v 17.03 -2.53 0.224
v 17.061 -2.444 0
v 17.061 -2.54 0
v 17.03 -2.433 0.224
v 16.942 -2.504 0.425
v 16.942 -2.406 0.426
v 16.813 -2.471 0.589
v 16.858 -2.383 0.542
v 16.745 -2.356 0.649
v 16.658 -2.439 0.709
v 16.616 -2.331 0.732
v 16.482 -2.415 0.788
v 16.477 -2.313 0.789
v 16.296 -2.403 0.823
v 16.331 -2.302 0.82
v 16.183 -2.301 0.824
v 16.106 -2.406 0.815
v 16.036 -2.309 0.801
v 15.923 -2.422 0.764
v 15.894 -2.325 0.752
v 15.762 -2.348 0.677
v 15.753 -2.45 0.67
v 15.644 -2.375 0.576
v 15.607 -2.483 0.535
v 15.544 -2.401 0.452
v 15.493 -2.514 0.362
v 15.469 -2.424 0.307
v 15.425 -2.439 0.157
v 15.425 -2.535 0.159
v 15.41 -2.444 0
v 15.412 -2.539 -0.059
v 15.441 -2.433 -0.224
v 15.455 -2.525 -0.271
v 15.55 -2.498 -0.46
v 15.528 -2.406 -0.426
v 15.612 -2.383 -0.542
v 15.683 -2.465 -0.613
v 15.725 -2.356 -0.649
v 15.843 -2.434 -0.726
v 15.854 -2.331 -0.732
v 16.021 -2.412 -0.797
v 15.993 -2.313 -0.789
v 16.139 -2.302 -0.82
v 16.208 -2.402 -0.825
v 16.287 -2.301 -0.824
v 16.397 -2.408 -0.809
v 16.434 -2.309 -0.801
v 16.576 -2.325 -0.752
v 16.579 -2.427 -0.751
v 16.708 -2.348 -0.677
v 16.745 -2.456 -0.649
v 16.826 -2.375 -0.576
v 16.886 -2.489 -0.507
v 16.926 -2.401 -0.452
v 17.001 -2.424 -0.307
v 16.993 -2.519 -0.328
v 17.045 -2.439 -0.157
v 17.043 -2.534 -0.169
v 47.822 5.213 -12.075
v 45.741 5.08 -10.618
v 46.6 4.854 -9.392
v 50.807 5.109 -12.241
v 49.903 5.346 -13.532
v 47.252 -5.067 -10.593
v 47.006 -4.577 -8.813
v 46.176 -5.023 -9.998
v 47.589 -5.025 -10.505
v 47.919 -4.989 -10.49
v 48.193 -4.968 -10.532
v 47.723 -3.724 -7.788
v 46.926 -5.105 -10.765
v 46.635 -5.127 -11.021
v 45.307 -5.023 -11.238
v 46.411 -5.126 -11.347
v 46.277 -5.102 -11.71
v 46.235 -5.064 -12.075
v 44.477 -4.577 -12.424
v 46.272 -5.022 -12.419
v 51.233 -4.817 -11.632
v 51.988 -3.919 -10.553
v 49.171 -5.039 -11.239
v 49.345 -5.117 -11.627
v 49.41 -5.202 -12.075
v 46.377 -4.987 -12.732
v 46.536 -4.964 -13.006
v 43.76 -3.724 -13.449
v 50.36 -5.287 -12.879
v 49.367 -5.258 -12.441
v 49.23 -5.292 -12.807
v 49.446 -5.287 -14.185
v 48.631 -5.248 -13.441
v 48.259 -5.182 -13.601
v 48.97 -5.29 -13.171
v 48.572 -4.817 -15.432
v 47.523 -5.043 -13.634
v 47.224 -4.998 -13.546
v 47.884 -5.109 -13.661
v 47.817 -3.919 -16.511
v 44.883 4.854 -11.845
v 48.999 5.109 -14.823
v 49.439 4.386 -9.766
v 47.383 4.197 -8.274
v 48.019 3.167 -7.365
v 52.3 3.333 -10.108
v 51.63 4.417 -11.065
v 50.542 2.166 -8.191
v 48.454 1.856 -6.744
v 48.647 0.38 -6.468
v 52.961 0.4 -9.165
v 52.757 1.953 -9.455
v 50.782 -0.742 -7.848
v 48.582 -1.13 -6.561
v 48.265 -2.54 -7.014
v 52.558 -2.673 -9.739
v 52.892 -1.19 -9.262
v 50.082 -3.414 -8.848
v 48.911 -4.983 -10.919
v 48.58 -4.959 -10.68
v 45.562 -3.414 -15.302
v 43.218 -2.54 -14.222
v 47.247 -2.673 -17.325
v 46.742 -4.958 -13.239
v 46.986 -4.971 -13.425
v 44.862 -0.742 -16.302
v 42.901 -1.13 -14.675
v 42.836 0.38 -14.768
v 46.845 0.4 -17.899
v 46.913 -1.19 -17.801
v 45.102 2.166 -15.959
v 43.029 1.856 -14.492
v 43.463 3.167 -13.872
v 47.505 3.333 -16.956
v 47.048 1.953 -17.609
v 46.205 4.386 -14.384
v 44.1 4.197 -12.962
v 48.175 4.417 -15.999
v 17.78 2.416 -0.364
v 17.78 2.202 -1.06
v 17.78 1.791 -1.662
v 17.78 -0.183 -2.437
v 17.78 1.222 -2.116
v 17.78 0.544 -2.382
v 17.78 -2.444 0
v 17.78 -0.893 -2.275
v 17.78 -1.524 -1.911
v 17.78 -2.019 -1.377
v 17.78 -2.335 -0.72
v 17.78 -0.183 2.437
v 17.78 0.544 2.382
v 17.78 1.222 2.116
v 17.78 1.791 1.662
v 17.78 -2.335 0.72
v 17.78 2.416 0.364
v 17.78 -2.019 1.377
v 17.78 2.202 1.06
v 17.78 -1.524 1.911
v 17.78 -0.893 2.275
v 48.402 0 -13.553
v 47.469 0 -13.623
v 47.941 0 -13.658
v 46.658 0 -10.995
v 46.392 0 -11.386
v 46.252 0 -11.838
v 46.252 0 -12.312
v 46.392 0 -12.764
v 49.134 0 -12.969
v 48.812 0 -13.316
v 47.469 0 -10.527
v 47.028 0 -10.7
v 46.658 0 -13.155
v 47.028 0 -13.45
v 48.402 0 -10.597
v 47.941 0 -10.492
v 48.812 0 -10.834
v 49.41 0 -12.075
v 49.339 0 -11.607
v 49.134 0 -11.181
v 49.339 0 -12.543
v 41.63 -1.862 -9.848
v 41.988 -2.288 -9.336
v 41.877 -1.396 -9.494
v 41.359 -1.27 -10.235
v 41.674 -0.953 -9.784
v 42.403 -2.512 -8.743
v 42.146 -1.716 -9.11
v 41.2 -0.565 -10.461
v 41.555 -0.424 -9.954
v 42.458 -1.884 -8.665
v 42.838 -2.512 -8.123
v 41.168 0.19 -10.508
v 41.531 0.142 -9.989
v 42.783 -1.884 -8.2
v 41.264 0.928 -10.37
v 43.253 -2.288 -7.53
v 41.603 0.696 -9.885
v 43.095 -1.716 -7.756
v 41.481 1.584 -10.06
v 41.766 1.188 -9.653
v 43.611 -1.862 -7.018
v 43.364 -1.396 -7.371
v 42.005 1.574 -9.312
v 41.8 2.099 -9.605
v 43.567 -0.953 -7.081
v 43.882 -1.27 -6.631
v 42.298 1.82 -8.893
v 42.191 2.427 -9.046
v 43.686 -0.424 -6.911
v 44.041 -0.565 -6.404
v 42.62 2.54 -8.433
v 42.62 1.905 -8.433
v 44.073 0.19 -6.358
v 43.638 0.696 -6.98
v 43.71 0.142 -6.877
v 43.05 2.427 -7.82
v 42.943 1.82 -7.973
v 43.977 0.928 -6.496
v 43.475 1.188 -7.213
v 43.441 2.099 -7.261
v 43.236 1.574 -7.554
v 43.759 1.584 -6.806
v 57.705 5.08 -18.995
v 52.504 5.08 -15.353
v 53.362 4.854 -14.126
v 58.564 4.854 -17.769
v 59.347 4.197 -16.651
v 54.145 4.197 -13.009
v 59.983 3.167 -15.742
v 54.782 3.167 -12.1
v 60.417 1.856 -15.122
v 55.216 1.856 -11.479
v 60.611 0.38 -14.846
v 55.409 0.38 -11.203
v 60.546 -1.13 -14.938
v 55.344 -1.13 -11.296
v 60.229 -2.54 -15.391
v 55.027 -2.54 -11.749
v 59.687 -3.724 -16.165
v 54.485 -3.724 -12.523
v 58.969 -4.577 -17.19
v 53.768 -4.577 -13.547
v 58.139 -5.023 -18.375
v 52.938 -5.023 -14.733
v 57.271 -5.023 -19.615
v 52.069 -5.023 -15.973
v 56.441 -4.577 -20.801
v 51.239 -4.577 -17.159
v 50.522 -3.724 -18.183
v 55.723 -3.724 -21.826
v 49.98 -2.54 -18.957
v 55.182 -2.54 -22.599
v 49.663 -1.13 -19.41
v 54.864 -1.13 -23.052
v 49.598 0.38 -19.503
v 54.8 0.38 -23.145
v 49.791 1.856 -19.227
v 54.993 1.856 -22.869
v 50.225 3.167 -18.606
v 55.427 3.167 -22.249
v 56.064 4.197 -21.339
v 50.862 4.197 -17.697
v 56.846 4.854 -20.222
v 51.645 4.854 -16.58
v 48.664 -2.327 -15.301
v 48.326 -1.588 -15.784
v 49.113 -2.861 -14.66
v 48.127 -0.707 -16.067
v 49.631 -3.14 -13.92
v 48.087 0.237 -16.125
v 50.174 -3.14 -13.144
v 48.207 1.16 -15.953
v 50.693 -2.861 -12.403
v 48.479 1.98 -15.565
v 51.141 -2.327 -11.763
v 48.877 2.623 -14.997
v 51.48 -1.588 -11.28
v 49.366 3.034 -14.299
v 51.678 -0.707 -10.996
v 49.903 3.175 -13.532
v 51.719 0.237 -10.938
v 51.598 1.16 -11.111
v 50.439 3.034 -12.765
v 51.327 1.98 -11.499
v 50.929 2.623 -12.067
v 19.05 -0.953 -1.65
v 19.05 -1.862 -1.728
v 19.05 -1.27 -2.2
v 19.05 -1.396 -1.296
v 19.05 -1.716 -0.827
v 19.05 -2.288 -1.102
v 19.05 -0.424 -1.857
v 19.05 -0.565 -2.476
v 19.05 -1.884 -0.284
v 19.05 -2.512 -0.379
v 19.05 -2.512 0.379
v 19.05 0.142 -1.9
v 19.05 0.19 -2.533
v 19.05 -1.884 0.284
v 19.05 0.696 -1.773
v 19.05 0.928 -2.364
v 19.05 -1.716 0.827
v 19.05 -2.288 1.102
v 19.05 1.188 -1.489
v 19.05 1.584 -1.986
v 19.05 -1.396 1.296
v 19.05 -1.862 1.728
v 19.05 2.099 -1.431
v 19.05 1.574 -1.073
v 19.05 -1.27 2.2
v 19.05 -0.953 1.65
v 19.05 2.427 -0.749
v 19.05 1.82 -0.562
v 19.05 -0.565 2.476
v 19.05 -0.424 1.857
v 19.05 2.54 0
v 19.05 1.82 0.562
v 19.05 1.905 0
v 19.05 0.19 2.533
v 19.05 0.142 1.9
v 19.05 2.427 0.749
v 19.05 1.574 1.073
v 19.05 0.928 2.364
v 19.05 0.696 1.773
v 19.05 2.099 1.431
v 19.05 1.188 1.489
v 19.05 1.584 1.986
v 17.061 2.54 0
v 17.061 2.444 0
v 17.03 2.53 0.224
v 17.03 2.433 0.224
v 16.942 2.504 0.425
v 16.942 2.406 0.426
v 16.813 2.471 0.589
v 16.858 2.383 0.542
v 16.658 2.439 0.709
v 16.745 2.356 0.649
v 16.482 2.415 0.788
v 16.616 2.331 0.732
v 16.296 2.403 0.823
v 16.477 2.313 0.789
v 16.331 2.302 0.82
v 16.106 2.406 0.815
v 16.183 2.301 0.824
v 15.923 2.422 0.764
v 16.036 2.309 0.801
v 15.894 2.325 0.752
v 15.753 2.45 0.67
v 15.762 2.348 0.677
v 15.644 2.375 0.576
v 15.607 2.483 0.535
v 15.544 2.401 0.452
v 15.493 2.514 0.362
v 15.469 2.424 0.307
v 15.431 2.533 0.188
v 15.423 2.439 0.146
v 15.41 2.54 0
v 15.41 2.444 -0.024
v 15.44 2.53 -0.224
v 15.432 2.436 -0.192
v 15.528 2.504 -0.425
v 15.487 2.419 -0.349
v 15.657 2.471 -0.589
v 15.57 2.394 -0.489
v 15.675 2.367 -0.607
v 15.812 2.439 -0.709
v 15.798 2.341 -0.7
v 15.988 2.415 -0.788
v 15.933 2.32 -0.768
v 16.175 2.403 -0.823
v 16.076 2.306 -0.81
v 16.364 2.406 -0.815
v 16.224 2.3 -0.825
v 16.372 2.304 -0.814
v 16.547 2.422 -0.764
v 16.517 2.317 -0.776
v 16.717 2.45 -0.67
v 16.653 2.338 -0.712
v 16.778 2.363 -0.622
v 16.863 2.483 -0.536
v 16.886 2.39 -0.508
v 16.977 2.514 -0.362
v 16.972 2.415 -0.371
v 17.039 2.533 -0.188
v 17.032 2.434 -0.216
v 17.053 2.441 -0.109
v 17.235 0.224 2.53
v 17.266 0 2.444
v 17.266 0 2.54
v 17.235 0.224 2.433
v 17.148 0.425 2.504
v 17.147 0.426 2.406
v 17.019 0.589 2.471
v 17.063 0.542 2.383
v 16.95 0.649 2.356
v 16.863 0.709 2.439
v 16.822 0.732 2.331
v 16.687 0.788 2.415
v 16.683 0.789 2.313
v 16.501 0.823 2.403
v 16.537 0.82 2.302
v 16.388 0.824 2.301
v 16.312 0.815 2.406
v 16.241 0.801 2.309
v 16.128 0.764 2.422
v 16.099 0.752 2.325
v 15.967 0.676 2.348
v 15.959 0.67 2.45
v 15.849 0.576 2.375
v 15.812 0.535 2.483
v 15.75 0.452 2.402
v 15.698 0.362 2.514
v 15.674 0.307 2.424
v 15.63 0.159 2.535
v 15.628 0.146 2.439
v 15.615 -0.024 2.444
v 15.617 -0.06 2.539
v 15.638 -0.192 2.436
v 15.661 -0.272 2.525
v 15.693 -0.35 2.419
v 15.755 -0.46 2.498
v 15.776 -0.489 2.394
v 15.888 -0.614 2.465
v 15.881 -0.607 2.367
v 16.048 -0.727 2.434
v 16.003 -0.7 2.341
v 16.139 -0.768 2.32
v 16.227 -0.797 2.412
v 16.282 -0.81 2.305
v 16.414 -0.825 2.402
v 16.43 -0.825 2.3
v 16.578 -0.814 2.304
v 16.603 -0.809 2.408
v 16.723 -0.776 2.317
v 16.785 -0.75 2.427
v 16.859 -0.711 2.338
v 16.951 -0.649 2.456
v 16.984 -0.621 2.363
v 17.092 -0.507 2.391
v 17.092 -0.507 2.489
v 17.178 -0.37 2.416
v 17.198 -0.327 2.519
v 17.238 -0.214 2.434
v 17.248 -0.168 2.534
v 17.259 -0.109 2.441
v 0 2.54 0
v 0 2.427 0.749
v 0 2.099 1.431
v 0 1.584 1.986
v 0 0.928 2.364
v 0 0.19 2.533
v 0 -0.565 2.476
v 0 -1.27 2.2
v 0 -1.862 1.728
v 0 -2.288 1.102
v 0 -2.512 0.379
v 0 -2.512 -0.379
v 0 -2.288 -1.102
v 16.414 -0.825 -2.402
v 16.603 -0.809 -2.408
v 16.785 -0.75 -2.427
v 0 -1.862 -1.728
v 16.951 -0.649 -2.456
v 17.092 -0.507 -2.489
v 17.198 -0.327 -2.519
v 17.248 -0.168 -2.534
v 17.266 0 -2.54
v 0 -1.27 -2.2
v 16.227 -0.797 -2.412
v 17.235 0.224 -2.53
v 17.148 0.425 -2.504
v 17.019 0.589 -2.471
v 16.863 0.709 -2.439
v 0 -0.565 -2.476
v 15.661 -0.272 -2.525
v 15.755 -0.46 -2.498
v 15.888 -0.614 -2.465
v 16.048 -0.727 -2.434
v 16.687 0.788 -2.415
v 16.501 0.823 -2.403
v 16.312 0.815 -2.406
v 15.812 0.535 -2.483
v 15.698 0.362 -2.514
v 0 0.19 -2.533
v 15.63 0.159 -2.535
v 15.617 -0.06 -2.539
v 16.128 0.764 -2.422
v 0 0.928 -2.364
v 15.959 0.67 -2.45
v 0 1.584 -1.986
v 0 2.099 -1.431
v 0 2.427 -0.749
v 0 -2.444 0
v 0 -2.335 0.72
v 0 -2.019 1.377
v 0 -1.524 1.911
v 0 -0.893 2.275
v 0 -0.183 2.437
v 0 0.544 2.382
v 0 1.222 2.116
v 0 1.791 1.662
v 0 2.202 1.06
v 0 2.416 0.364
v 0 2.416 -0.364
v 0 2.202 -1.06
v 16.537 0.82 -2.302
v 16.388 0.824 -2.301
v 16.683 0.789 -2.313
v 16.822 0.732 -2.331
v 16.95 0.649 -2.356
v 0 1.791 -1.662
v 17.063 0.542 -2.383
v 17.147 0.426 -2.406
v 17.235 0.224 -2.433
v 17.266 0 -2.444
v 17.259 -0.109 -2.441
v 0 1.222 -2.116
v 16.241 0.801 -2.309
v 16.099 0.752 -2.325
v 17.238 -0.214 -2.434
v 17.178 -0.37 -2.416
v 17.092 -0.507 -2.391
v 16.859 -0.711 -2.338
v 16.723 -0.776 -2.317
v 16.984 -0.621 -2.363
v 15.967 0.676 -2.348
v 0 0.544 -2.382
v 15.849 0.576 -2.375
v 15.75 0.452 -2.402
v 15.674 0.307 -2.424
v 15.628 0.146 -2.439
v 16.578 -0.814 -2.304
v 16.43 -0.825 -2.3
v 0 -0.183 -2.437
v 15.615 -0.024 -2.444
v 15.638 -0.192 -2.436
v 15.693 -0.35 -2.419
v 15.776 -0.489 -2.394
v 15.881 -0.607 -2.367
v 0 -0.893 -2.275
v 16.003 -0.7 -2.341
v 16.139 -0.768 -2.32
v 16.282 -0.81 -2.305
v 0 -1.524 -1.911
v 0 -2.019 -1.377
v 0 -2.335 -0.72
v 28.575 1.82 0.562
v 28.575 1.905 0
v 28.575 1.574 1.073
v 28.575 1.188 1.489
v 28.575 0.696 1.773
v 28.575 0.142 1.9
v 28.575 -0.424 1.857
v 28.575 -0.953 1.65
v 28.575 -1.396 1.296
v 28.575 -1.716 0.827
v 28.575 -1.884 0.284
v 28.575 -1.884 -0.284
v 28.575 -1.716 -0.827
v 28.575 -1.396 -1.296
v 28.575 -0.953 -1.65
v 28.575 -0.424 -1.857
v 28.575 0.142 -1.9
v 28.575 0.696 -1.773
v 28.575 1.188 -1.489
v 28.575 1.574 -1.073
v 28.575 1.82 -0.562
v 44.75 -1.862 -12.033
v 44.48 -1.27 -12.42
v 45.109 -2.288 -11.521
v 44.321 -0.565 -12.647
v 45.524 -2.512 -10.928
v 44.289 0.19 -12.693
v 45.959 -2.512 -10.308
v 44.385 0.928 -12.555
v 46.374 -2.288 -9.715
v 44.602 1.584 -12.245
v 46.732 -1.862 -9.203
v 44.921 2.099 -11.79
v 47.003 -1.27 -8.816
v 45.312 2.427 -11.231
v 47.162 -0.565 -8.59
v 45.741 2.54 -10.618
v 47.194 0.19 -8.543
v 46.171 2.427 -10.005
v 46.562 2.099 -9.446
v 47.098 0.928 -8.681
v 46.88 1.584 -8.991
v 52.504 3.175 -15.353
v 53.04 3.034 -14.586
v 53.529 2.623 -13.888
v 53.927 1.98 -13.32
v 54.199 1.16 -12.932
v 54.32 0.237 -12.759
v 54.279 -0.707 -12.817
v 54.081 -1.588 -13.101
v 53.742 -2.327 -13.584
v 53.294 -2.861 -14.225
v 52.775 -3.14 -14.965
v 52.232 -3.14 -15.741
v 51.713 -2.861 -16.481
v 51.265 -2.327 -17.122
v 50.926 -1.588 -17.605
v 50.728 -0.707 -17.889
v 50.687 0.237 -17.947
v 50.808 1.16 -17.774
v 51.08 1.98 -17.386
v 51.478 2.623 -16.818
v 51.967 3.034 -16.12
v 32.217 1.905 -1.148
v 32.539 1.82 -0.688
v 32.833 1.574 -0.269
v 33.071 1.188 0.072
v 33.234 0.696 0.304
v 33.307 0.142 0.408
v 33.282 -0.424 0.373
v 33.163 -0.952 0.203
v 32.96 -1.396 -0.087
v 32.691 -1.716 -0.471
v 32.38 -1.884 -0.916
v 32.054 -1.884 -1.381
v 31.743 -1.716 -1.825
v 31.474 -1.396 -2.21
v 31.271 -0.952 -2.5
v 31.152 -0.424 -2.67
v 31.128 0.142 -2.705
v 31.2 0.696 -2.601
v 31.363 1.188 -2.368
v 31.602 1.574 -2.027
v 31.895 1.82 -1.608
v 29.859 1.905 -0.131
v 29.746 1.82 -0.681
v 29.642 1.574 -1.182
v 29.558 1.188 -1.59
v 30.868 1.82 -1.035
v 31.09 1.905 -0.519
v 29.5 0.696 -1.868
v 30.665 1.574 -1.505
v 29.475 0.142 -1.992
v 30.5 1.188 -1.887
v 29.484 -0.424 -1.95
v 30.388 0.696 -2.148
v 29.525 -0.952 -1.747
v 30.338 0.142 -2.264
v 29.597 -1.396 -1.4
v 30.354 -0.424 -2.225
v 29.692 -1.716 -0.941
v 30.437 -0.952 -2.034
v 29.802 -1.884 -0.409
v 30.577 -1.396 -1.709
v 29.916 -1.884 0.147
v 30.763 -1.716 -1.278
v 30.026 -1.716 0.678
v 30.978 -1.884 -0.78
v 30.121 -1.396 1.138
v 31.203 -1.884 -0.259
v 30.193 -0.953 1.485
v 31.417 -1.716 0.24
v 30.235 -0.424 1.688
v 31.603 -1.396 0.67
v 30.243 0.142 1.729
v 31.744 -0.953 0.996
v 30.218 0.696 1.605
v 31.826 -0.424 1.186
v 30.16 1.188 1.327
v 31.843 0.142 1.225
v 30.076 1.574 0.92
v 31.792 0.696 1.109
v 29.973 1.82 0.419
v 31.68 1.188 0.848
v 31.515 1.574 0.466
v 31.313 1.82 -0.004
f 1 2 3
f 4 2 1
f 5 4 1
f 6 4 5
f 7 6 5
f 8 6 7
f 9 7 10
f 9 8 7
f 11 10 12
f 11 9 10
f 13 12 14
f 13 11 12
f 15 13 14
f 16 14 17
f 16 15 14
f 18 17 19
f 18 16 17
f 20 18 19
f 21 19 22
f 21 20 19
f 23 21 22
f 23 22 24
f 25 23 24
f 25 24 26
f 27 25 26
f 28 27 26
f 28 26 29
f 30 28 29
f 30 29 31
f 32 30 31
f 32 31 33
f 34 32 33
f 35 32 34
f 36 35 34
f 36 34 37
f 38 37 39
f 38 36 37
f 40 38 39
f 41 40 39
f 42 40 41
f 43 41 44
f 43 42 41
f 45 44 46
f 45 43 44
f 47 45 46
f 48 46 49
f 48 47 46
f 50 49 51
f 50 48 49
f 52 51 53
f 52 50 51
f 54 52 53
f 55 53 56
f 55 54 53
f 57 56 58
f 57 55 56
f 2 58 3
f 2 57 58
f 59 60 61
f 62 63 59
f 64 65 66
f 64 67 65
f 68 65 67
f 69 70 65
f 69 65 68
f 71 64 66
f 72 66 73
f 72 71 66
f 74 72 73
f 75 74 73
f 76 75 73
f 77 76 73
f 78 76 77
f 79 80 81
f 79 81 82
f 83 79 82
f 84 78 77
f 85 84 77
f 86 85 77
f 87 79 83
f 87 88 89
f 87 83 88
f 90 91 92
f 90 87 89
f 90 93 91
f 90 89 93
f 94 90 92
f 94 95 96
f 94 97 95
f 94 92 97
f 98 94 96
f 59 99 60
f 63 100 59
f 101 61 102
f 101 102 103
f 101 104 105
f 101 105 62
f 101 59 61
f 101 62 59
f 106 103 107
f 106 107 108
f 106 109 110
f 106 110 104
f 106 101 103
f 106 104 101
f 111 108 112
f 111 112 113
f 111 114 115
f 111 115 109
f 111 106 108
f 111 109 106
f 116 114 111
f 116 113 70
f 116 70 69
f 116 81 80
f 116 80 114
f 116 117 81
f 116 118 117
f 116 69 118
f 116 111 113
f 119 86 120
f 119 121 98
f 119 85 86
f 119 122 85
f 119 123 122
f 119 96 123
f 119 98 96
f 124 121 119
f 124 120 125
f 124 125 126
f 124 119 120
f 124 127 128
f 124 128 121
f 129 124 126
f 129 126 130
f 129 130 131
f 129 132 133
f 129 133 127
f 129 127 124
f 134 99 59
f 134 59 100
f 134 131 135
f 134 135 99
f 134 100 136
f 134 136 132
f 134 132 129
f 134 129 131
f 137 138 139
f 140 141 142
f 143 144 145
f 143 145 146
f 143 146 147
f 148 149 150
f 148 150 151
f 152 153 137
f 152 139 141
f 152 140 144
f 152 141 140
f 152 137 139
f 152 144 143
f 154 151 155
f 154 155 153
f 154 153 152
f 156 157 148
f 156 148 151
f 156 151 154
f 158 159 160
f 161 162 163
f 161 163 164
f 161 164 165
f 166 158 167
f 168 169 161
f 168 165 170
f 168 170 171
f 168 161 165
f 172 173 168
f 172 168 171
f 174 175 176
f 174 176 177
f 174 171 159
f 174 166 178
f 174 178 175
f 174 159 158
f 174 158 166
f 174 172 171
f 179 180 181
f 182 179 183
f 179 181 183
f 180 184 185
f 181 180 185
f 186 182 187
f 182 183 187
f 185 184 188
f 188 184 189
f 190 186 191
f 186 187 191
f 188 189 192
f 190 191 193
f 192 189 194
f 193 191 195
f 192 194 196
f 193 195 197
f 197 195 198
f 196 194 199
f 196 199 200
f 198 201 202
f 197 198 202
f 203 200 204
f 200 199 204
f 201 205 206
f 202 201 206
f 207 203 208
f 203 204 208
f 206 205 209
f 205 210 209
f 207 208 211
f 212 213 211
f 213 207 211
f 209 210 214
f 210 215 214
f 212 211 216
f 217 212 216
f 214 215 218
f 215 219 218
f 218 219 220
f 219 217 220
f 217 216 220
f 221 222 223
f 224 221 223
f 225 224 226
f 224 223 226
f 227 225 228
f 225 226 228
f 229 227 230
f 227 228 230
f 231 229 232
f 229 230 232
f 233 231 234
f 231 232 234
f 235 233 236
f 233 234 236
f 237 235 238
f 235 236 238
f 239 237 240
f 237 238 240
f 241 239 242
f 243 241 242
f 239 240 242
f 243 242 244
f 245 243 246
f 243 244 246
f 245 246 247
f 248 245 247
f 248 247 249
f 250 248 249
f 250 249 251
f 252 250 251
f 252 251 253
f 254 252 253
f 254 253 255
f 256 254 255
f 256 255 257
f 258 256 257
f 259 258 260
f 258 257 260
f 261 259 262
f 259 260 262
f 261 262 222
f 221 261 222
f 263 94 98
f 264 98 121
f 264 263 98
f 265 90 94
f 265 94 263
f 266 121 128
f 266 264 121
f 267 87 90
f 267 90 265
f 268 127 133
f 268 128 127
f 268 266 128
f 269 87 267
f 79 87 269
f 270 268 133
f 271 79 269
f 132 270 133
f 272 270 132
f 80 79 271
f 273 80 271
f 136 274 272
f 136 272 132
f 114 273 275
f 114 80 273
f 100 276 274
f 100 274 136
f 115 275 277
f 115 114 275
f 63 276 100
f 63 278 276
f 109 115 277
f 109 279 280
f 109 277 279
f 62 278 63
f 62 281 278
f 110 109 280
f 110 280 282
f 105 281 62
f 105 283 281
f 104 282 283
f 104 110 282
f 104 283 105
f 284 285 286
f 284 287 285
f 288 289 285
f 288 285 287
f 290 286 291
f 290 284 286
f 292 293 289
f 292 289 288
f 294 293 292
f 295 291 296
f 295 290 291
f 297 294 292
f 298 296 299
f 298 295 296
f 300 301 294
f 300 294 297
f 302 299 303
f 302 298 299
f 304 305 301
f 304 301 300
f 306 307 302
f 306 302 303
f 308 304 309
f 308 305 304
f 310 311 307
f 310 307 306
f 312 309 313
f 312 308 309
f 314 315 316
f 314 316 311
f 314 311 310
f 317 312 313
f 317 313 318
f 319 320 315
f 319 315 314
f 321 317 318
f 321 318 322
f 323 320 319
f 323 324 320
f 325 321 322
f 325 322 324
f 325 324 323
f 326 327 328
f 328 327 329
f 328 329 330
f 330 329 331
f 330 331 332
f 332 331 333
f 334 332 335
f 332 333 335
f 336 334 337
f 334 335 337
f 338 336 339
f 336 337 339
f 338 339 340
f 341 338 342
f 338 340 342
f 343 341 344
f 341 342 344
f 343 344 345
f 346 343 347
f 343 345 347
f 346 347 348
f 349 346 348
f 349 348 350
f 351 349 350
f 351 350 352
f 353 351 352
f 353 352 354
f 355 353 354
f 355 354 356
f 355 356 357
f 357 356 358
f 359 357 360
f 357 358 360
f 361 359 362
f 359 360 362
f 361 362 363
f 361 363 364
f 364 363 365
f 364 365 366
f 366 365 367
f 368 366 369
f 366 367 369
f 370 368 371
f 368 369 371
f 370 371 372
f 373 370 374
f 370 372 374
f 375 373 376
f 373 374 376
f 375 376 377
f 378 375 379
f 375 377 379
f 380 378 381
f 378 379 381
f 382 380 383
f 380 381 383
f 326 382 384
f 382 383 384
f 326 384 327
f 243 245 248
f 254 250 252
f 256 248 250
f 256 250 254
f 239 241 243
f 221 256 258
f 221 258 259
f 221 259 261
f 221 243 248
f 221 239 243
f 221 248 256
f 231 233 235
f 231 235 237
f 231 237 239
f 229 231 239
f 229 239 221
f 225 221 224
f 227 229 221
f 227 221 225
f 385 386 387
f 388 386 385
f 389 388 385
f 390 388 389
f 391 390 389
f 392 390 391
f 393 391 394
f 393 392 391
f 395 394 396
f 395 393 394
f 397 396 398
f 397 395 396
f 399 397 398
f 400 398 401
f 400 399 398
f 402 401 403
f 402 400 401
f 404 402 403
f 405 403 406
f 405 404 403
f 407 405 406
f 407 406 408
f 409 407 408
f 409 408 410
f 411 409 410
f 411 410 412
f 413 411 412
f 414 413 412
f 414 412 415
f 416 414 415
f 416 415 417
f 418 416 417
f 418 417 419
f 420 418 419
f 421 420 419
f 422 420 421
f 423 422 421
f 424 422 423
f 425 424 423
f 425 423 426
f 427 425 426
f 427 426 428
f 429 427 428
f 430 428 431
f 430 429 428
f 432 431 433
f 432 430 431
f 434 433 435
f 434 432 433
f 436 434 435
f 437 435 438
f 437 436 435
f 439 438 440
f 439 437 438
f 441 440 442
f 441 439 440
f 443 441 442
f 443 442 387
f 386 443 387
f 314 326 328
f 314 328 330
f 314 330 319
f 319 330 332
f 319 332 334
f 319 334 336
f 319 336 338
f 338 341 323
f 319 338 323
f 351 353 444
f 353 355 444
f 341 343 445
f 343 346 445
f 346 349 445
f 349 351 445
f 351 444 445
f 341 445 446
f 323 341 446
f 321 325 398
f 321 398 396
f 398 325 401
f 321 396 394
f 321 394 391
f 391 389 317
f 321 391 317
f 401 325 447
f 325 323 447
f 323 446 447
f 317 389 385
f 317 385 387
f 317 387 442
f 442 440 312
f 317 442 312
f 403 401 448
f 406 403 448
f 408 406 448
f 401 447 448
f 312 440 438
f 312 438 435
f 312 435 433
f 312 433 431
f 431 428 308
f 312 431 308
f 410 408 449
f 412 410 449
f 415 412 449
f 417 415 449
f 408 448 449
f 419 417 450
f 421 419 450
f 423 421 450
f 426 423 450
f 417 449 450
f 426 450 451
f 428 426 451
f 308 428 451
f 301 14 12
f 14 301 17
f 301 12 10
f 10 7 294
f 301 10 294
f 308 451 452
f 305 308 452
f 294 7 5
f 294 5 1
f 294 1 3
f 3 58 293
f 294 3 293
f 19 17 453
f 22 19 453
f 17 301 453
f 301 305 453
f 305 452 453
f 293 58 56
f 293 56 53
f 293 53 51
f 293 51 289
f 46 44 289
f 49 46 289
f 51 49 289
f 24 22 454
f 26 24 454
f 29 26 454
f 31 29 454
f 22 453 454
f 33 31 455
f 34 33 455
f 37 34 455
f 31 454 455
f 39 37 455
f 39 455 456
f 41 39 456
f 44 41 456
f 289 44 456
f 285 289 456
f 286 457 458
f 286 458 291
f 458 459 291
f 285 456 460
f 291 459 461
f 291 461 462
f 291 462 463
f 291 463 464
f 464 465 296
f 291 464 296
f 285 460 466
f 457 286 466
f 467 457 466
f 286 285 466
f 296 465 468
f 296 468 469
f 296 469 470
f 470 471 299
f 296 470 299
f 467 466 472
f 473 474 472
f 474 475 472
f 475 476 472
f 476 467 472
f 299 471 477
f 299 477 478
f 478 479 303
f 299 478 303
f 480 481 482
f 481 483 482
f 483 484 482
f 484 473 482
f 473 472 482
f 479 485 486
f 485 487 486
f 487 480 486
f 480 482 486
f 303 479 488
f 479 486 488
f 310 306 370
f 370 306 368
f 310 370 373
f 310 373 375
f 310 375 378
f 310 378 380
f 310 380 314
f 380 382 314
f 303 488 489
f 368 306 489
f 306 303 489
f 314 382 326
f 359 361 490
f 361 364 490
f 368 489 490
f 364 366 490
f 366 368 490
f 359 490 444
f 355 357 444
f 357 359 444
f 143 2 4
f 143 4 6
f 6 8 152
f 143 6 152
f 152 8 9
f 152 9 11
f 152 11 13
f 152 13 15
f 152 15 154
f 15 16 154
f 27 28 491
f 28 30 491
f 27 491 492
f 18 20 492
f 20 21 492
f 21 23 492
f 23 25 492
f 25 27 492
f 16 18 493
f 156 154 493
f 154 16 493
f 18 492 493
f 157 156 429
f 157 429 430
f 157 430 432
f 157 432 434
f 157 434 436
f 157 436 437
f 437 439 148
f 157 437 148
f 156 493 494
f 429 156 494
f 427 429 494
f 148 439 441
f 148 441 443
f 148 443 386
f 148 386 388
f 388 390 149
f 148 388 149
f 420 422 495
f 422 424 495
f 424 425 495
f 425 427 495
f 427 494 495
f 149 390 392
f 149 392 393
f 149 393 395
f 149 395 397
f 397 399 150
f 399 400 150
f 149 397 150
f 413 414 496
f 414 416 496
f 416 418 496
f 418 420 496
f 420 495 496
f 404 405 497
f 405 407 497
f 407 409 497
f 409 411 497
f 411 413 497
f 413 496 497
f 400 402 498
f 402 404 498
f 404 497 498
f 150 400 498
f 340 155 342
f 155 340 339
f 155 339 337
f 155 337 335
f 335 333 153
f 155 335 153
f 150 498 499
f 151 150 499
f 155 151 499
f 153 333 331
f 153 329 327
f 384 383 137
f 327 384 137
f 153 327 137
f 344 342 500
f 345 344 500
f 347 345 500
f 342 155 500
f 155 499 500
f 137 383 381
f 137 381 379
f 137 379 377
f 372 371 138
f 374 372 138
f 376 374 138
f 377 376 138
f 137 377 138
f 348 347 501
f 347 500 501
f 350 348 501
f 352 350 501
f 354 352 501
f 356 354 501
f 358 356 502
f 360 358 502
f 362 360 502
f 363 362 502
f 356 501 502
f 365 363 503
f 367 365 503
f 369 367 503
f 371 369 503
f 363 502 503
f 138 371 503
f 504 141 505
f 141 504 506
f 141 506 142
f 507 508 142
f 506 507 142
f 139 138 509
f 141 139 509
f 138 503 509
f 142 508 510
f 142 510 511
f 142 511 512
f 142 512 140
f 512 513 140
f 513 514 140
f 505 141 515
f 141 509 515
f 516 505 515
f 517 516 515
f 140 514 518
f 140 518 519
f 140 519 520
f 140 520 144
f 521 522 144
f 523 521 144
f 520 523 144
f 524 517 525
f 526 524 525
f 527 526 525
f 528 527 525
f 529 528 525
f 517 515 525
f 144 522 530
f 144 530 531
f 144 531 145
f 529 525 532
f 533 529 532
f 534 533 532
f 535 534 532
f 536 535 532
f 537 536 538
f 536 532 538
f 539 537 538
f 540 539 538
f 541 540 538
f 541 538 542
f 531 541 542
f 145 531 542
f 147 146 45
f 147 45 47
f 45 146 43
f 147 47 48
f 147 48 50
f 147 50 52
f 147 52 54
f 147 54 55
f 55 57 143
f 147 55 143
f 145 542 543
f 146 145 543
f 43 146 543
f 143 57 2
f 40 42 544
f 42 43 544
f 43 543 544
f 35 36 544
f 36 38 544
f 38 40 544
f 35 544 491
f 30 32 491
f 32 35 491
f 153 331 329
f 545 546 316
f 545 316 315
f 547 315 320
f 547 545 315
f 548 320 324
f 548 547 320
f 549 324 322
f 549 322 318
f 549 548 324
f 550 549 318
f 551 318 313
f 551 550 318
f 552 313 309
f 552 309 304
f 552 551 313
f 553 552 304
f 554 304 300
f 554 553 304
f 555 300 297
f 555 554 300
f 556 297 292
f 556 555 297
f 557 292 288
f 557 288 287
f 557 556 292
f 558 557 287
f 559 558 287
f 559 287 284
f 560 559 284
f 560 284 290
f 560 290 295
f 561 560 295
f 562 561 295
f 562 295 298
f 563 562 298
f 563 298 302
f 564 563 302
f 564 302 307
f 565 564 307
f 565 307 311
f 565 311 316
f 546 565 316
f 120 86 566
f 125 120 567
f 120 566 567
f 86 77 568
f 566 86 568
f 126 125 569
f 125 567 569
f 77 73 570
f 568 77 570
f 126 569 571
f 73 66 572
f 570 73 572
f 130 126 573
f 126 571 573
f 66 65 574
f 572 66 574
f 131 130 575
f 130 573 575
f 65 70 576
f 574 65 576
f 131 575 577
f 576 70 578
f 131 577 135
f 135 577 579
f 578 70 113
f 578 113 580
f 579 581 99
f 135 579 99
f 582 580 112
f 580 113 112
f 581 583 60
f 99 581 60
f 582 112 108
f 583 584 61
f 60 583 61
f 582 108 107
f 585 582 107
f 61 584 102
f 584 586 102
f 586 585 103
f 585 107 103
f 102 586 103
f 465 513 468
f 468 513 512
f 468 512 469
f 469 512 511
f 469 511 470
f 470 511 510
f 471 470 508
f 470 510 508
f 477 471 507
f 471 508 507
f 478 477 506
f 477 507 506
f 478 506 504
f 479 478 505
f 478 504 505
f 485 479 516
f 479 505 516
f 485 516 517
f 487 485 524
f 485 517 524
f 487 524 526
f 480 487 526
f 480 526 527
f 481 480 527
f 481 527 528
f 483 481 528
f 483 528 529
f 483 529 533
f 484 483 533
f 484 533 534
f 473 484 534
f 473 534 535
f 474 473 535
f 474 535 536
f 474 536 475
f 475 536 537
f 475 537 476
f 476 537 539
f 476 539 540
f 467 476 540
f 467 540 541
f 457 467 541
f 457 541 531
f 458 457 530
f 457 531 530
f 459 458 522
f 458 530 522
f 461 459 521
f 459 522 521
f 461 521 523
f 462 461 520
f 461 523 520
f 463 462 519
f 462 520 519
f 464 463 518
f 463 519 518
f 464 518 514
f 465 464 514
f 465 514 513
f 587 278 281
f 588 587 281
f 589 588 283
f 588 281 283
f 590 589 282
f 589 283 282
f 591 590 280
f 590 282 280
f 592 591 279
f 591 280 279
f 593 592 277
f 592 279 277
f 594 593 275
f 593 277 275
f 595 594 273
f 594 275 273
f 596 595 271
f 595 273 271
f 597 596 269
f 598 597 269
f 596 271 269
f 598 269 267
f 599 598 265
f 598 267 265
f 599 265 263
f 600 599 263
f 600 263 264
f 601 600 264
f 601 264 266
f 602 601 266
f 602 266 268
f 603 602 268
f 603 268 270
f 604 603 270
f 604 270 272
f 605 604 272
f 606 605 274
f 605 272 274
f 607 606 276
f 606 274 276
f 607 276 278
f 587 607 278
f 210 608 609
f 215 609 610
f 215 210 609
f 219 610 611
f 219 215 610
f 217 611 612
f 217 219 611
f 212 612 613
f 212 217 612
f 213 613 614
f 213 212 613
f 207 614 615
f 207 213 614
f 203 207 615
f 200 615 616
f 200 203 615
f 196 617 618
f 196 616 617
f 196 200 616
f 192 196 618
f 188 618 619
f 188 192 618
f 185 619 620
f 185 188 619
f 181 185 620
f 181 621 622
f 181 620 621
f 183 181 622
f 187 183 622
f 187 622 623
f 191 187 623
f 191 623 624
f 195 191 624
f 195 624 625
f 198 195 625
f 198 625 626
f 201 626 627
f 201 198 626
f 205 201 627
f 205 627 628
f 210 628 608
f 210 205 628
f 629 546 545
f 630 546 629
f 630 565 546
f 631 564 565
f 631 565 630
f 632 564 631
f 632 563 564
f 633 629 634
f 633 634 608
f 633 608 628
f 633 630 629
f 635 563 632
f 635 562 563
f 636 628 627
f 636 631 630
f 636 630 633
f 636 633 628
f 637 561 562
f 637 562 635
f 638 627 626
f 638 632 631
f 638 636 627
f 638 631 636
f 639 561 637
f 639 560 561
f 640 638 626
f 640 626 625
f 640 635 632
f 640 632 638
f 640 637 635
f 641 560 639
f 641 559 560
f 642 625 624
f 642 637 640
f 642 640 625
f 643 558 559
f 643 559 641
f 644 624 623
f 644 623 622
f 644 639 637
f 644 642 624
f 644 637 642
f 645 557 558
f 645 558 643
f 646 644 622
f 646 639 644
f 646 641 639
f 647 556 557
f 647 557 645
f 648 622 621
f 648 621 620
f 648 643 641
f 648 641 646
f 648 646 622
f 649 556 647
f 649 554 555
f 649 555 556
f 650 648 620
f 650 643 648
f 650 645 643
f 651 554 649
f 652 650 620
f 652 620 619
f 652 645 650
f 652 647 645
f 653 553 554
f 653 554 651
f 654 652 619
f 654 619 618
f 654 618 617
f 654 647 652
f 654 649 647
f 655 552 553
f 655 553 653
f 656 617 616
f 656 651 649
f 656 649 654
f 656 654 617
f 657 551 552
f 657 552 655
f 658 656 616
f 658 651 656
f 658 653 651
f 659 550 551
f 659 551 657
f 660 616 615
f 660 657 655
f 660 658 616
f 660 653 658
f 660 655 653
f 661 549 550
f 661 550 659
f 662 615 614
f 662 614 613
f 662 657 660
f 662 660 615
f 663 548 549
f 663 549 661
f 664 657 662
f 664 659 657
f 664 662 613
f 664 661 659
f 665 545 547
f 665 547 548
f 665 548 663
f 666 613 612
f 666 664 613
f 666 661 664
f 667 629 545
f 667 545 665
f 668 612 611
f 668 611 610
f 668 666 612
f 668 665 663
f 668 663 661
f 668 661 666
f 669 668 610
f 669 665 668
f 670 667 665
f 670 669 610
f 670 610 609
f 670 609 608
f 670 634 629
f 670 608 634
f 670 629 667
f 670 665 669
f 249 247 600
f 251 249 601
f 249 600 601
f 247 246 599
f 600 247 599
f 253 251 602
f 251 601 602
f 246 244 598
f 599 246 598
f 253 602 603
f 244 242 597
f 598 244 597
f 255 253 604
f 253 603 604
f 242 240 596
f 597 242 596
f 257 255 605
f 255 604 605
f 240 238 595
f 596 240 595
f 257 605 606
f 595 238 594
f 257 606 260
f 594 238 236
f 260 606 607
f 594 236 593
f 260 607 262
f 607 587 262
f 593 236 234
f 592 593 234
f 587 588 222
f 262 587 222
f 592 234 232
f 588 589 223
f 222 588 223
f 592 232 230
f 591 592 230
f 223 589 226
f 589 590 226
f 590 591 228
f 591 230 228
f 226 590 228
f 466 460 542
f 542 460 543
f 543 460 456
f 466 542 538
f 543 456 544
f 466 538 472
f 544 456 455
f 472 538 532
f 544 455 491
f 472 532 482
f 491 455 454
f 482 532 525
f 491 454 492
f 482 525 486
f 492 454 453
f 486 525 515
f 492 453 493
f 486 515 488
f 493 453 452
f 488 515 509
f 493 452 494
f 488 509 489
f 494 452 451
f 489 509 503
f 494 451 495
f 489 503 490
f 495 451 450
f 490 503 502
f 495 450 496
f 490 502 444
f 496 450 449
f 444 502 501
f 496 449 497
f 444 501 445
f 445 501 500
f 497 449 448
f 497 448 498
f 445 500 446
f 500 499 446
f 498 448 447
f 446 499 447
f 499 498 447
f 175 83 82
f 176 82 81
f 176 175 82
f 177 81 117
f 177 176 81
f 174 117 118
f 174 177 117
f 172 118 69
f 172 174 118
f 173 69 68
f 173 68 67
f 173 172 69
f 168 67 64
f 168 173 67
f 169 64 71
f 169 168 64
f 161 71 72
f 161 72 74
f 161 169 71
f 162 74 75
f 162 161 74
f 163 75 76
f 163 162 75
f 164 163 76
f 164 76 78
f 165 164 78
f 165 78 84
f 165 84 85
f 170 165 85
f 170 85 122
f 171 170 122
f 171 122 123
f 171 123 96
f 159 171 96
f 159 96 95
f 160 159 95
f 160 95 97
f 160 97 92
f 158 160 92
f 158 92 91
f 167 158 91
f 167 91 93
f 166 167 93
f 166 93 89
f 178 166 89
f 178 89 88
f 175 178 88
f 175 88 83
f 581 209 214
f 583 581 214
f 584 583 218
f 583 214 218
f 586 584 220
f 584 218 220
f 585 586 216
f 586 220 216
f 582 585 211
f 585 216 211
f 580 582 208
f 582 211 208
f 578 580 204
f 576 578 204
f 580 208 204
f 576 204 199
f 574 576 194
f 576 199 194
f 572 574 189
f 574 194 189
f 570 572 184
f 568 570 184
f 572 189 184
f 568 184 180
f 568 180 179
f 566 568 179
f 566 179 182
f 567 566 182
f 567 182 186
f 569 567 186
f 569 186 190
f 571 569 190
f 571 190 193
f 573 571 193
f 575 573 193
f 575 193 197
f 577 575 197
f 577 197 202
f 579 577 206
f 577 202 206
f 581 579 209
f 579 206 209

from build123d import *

# Parameters (mm, degrees)
F0_R           = 2.54
F1_DEPTH       = 19.05
F2_R           = 1.905
F5_R           = 2.54
F5_R_2         = 1.905
F6_DEPTH       = 3.81
F7_R           = 5.08
F7_R_2         = 2.54
F8_DEPTH       = 5.08
F8_TAPER       = -3
F9_R           = 3.175
F10_DEPTH      = 3.175
F11_R          = 5.08
F11_R_2        = 3.175
F12_DEPTH      = 6.35
F13_R          = 2.4436980308
F14_DEPTH      = 17.78
F15_R          = 0.8255
F16_DEPTH      = 23.1575077208
F16_DEPTH_BACK = 2.541
F17_R          = 0.8255
F18_DEPTH      = 5.3472316188
F18_DEPTH_BACK = 5.3472316188
F19_R          = 1.5875
F20_DEPTH      = 5.3472316188


with BuildPart() as f1:
    # F0 (on Right) → F1 (new body)
    with BuildSketch(Plane.YZ):
        Circle(F0_R)
    extrude(amount=F1_DEPTH)

    # F4: sweep along a path in F3
    with BuildLine(Plane.XZ) as f4_path:
        Line((19.05, 0), (28.575, 0))
        ThreePointArc((28.575, 0), (30.4844818269, -0.2938973627), (32.2172103708, -1.1483845188))
        Line((32.2172103708, -1.1483845188), (42.6204413333, -8.4328052604))
    # F2 (on face) → F4 (sweep)
    with BuildSketch(Plane.YZ.offset(19.05)):
        Circle(F2_R)
    sweep(path=f4_path.line)

    # F5 (on face) → F6 (join)
    with BuildSketch(Plane(origin=(32.5608678312, 0, -22.7993651061), x_dir=(0, 1, 0), z_dir=(0.8191520443, 0, -0.5735764364))):
        with Locations((0, 17.5383311875)):
            Circle(F5_R)
        with Locations((0, 17.5383311875)):
            Circle(F5_R_2, mode=Mode.SUBTRACT)
        with Locations((0, 17.5383311875)):
            Circle(F5_R_2)
    extrude(amount=F6_DEPTH)

    # F7 (on face) → F8 (join)
    with BuildSketch(Plane(origin=(35.68183712, 0, -24.9846913286), x_dir=(0, 1, 0), z_dir=(0.8191520443, 0, -0.5735764364))):
        with Locations((0, 17.5383311875)):
            Circle(F7_R)
        with Locations((0, 17.5383311875)):
            Circle(F7_R_2, mode=Mode.SUBTRACT)
        with Locations((0, 17.5383311875)):
            Circle(F7_R_2)
    extrude(amount=F8_DEPTH, taper=F8_TAPER)

    # F9 (on face) → F10 (join)
    with BuildSketch(Plane(origin=(39.843129505, 0, -27.8984596252), x_dir=(0, 1, 0), z_dir=(0.8191520443, 0, -0.5735764364))):
        with Locations((0, 17.5383311875)):
            Circle(F9_R)
    extrude(amount=F10_DEPTH)

    # F11 (on face) → F12 (join)
    with BuildSketch(Plane(origin=(42.4439372456, 0, -29.7195648107), x_dir=(0, 1, 0), z_dir=(0.8191520443, 0, -0.5735764364))):
        with Locations((0, 17.5383311875)):
            Circle(F11_R)
        with Locations((0, 17.5383311875)):
            Circle(F11_R_2, mode=Mode.SUBTRACT)
        with Locations((0, 17.5383311875)):
            Circle(F11_R_2)
    extrude(amount=F12_DEPTH)

    # F13 (on face) → F14 (cut)
    with BuildSketch(Plane(origin=(0, 0, 0), x_dir=(0, -1, 0), z_dir=(-1, 0, 0))):
        Circle(F13_R)
    extrude(amount=-F14_DEPTH, mode=Mode.SUBTRACT)

    # F15 (on Top) → F16 (cut, two sides)
    with BuildSketch(Plane.XY) as f16_sk:
        with Locations((16.4403449744, 0)):
            Circle(F15_R)
    extrude(amount=-F16_DEPTH, mode=Mode.SUBTRACT)
    extrude(f16_sk.sketch, amount=F16_DEPTH_BACK, mode=Mode.SUBTRACT)

    # F17 (on Front) → F18 (cut, two sides)
    with BuildSketch(Plane.XZ) as f18_sk:
        with Locations((16.2350572646, 0)):
            Circle(F17_R)
    extrude(amount=-F18_DEPTH, mode=Mode.SUBTRACT)
    extrude(f18_sk.sketch, amount=F18_DEPTH_BACK, mode=Mode.SUBTRACT)

    # F19 (on Front) → F20 (cut, through all)
    with BuildSketch(Plane.XZ):
        with Locations((47.8220568145, -12.0750156313)):
            Circle(F19_R)
    extrude(amount=F20_DEPTH, mode=Mode.SUBTRACT)


solid = f1.part
